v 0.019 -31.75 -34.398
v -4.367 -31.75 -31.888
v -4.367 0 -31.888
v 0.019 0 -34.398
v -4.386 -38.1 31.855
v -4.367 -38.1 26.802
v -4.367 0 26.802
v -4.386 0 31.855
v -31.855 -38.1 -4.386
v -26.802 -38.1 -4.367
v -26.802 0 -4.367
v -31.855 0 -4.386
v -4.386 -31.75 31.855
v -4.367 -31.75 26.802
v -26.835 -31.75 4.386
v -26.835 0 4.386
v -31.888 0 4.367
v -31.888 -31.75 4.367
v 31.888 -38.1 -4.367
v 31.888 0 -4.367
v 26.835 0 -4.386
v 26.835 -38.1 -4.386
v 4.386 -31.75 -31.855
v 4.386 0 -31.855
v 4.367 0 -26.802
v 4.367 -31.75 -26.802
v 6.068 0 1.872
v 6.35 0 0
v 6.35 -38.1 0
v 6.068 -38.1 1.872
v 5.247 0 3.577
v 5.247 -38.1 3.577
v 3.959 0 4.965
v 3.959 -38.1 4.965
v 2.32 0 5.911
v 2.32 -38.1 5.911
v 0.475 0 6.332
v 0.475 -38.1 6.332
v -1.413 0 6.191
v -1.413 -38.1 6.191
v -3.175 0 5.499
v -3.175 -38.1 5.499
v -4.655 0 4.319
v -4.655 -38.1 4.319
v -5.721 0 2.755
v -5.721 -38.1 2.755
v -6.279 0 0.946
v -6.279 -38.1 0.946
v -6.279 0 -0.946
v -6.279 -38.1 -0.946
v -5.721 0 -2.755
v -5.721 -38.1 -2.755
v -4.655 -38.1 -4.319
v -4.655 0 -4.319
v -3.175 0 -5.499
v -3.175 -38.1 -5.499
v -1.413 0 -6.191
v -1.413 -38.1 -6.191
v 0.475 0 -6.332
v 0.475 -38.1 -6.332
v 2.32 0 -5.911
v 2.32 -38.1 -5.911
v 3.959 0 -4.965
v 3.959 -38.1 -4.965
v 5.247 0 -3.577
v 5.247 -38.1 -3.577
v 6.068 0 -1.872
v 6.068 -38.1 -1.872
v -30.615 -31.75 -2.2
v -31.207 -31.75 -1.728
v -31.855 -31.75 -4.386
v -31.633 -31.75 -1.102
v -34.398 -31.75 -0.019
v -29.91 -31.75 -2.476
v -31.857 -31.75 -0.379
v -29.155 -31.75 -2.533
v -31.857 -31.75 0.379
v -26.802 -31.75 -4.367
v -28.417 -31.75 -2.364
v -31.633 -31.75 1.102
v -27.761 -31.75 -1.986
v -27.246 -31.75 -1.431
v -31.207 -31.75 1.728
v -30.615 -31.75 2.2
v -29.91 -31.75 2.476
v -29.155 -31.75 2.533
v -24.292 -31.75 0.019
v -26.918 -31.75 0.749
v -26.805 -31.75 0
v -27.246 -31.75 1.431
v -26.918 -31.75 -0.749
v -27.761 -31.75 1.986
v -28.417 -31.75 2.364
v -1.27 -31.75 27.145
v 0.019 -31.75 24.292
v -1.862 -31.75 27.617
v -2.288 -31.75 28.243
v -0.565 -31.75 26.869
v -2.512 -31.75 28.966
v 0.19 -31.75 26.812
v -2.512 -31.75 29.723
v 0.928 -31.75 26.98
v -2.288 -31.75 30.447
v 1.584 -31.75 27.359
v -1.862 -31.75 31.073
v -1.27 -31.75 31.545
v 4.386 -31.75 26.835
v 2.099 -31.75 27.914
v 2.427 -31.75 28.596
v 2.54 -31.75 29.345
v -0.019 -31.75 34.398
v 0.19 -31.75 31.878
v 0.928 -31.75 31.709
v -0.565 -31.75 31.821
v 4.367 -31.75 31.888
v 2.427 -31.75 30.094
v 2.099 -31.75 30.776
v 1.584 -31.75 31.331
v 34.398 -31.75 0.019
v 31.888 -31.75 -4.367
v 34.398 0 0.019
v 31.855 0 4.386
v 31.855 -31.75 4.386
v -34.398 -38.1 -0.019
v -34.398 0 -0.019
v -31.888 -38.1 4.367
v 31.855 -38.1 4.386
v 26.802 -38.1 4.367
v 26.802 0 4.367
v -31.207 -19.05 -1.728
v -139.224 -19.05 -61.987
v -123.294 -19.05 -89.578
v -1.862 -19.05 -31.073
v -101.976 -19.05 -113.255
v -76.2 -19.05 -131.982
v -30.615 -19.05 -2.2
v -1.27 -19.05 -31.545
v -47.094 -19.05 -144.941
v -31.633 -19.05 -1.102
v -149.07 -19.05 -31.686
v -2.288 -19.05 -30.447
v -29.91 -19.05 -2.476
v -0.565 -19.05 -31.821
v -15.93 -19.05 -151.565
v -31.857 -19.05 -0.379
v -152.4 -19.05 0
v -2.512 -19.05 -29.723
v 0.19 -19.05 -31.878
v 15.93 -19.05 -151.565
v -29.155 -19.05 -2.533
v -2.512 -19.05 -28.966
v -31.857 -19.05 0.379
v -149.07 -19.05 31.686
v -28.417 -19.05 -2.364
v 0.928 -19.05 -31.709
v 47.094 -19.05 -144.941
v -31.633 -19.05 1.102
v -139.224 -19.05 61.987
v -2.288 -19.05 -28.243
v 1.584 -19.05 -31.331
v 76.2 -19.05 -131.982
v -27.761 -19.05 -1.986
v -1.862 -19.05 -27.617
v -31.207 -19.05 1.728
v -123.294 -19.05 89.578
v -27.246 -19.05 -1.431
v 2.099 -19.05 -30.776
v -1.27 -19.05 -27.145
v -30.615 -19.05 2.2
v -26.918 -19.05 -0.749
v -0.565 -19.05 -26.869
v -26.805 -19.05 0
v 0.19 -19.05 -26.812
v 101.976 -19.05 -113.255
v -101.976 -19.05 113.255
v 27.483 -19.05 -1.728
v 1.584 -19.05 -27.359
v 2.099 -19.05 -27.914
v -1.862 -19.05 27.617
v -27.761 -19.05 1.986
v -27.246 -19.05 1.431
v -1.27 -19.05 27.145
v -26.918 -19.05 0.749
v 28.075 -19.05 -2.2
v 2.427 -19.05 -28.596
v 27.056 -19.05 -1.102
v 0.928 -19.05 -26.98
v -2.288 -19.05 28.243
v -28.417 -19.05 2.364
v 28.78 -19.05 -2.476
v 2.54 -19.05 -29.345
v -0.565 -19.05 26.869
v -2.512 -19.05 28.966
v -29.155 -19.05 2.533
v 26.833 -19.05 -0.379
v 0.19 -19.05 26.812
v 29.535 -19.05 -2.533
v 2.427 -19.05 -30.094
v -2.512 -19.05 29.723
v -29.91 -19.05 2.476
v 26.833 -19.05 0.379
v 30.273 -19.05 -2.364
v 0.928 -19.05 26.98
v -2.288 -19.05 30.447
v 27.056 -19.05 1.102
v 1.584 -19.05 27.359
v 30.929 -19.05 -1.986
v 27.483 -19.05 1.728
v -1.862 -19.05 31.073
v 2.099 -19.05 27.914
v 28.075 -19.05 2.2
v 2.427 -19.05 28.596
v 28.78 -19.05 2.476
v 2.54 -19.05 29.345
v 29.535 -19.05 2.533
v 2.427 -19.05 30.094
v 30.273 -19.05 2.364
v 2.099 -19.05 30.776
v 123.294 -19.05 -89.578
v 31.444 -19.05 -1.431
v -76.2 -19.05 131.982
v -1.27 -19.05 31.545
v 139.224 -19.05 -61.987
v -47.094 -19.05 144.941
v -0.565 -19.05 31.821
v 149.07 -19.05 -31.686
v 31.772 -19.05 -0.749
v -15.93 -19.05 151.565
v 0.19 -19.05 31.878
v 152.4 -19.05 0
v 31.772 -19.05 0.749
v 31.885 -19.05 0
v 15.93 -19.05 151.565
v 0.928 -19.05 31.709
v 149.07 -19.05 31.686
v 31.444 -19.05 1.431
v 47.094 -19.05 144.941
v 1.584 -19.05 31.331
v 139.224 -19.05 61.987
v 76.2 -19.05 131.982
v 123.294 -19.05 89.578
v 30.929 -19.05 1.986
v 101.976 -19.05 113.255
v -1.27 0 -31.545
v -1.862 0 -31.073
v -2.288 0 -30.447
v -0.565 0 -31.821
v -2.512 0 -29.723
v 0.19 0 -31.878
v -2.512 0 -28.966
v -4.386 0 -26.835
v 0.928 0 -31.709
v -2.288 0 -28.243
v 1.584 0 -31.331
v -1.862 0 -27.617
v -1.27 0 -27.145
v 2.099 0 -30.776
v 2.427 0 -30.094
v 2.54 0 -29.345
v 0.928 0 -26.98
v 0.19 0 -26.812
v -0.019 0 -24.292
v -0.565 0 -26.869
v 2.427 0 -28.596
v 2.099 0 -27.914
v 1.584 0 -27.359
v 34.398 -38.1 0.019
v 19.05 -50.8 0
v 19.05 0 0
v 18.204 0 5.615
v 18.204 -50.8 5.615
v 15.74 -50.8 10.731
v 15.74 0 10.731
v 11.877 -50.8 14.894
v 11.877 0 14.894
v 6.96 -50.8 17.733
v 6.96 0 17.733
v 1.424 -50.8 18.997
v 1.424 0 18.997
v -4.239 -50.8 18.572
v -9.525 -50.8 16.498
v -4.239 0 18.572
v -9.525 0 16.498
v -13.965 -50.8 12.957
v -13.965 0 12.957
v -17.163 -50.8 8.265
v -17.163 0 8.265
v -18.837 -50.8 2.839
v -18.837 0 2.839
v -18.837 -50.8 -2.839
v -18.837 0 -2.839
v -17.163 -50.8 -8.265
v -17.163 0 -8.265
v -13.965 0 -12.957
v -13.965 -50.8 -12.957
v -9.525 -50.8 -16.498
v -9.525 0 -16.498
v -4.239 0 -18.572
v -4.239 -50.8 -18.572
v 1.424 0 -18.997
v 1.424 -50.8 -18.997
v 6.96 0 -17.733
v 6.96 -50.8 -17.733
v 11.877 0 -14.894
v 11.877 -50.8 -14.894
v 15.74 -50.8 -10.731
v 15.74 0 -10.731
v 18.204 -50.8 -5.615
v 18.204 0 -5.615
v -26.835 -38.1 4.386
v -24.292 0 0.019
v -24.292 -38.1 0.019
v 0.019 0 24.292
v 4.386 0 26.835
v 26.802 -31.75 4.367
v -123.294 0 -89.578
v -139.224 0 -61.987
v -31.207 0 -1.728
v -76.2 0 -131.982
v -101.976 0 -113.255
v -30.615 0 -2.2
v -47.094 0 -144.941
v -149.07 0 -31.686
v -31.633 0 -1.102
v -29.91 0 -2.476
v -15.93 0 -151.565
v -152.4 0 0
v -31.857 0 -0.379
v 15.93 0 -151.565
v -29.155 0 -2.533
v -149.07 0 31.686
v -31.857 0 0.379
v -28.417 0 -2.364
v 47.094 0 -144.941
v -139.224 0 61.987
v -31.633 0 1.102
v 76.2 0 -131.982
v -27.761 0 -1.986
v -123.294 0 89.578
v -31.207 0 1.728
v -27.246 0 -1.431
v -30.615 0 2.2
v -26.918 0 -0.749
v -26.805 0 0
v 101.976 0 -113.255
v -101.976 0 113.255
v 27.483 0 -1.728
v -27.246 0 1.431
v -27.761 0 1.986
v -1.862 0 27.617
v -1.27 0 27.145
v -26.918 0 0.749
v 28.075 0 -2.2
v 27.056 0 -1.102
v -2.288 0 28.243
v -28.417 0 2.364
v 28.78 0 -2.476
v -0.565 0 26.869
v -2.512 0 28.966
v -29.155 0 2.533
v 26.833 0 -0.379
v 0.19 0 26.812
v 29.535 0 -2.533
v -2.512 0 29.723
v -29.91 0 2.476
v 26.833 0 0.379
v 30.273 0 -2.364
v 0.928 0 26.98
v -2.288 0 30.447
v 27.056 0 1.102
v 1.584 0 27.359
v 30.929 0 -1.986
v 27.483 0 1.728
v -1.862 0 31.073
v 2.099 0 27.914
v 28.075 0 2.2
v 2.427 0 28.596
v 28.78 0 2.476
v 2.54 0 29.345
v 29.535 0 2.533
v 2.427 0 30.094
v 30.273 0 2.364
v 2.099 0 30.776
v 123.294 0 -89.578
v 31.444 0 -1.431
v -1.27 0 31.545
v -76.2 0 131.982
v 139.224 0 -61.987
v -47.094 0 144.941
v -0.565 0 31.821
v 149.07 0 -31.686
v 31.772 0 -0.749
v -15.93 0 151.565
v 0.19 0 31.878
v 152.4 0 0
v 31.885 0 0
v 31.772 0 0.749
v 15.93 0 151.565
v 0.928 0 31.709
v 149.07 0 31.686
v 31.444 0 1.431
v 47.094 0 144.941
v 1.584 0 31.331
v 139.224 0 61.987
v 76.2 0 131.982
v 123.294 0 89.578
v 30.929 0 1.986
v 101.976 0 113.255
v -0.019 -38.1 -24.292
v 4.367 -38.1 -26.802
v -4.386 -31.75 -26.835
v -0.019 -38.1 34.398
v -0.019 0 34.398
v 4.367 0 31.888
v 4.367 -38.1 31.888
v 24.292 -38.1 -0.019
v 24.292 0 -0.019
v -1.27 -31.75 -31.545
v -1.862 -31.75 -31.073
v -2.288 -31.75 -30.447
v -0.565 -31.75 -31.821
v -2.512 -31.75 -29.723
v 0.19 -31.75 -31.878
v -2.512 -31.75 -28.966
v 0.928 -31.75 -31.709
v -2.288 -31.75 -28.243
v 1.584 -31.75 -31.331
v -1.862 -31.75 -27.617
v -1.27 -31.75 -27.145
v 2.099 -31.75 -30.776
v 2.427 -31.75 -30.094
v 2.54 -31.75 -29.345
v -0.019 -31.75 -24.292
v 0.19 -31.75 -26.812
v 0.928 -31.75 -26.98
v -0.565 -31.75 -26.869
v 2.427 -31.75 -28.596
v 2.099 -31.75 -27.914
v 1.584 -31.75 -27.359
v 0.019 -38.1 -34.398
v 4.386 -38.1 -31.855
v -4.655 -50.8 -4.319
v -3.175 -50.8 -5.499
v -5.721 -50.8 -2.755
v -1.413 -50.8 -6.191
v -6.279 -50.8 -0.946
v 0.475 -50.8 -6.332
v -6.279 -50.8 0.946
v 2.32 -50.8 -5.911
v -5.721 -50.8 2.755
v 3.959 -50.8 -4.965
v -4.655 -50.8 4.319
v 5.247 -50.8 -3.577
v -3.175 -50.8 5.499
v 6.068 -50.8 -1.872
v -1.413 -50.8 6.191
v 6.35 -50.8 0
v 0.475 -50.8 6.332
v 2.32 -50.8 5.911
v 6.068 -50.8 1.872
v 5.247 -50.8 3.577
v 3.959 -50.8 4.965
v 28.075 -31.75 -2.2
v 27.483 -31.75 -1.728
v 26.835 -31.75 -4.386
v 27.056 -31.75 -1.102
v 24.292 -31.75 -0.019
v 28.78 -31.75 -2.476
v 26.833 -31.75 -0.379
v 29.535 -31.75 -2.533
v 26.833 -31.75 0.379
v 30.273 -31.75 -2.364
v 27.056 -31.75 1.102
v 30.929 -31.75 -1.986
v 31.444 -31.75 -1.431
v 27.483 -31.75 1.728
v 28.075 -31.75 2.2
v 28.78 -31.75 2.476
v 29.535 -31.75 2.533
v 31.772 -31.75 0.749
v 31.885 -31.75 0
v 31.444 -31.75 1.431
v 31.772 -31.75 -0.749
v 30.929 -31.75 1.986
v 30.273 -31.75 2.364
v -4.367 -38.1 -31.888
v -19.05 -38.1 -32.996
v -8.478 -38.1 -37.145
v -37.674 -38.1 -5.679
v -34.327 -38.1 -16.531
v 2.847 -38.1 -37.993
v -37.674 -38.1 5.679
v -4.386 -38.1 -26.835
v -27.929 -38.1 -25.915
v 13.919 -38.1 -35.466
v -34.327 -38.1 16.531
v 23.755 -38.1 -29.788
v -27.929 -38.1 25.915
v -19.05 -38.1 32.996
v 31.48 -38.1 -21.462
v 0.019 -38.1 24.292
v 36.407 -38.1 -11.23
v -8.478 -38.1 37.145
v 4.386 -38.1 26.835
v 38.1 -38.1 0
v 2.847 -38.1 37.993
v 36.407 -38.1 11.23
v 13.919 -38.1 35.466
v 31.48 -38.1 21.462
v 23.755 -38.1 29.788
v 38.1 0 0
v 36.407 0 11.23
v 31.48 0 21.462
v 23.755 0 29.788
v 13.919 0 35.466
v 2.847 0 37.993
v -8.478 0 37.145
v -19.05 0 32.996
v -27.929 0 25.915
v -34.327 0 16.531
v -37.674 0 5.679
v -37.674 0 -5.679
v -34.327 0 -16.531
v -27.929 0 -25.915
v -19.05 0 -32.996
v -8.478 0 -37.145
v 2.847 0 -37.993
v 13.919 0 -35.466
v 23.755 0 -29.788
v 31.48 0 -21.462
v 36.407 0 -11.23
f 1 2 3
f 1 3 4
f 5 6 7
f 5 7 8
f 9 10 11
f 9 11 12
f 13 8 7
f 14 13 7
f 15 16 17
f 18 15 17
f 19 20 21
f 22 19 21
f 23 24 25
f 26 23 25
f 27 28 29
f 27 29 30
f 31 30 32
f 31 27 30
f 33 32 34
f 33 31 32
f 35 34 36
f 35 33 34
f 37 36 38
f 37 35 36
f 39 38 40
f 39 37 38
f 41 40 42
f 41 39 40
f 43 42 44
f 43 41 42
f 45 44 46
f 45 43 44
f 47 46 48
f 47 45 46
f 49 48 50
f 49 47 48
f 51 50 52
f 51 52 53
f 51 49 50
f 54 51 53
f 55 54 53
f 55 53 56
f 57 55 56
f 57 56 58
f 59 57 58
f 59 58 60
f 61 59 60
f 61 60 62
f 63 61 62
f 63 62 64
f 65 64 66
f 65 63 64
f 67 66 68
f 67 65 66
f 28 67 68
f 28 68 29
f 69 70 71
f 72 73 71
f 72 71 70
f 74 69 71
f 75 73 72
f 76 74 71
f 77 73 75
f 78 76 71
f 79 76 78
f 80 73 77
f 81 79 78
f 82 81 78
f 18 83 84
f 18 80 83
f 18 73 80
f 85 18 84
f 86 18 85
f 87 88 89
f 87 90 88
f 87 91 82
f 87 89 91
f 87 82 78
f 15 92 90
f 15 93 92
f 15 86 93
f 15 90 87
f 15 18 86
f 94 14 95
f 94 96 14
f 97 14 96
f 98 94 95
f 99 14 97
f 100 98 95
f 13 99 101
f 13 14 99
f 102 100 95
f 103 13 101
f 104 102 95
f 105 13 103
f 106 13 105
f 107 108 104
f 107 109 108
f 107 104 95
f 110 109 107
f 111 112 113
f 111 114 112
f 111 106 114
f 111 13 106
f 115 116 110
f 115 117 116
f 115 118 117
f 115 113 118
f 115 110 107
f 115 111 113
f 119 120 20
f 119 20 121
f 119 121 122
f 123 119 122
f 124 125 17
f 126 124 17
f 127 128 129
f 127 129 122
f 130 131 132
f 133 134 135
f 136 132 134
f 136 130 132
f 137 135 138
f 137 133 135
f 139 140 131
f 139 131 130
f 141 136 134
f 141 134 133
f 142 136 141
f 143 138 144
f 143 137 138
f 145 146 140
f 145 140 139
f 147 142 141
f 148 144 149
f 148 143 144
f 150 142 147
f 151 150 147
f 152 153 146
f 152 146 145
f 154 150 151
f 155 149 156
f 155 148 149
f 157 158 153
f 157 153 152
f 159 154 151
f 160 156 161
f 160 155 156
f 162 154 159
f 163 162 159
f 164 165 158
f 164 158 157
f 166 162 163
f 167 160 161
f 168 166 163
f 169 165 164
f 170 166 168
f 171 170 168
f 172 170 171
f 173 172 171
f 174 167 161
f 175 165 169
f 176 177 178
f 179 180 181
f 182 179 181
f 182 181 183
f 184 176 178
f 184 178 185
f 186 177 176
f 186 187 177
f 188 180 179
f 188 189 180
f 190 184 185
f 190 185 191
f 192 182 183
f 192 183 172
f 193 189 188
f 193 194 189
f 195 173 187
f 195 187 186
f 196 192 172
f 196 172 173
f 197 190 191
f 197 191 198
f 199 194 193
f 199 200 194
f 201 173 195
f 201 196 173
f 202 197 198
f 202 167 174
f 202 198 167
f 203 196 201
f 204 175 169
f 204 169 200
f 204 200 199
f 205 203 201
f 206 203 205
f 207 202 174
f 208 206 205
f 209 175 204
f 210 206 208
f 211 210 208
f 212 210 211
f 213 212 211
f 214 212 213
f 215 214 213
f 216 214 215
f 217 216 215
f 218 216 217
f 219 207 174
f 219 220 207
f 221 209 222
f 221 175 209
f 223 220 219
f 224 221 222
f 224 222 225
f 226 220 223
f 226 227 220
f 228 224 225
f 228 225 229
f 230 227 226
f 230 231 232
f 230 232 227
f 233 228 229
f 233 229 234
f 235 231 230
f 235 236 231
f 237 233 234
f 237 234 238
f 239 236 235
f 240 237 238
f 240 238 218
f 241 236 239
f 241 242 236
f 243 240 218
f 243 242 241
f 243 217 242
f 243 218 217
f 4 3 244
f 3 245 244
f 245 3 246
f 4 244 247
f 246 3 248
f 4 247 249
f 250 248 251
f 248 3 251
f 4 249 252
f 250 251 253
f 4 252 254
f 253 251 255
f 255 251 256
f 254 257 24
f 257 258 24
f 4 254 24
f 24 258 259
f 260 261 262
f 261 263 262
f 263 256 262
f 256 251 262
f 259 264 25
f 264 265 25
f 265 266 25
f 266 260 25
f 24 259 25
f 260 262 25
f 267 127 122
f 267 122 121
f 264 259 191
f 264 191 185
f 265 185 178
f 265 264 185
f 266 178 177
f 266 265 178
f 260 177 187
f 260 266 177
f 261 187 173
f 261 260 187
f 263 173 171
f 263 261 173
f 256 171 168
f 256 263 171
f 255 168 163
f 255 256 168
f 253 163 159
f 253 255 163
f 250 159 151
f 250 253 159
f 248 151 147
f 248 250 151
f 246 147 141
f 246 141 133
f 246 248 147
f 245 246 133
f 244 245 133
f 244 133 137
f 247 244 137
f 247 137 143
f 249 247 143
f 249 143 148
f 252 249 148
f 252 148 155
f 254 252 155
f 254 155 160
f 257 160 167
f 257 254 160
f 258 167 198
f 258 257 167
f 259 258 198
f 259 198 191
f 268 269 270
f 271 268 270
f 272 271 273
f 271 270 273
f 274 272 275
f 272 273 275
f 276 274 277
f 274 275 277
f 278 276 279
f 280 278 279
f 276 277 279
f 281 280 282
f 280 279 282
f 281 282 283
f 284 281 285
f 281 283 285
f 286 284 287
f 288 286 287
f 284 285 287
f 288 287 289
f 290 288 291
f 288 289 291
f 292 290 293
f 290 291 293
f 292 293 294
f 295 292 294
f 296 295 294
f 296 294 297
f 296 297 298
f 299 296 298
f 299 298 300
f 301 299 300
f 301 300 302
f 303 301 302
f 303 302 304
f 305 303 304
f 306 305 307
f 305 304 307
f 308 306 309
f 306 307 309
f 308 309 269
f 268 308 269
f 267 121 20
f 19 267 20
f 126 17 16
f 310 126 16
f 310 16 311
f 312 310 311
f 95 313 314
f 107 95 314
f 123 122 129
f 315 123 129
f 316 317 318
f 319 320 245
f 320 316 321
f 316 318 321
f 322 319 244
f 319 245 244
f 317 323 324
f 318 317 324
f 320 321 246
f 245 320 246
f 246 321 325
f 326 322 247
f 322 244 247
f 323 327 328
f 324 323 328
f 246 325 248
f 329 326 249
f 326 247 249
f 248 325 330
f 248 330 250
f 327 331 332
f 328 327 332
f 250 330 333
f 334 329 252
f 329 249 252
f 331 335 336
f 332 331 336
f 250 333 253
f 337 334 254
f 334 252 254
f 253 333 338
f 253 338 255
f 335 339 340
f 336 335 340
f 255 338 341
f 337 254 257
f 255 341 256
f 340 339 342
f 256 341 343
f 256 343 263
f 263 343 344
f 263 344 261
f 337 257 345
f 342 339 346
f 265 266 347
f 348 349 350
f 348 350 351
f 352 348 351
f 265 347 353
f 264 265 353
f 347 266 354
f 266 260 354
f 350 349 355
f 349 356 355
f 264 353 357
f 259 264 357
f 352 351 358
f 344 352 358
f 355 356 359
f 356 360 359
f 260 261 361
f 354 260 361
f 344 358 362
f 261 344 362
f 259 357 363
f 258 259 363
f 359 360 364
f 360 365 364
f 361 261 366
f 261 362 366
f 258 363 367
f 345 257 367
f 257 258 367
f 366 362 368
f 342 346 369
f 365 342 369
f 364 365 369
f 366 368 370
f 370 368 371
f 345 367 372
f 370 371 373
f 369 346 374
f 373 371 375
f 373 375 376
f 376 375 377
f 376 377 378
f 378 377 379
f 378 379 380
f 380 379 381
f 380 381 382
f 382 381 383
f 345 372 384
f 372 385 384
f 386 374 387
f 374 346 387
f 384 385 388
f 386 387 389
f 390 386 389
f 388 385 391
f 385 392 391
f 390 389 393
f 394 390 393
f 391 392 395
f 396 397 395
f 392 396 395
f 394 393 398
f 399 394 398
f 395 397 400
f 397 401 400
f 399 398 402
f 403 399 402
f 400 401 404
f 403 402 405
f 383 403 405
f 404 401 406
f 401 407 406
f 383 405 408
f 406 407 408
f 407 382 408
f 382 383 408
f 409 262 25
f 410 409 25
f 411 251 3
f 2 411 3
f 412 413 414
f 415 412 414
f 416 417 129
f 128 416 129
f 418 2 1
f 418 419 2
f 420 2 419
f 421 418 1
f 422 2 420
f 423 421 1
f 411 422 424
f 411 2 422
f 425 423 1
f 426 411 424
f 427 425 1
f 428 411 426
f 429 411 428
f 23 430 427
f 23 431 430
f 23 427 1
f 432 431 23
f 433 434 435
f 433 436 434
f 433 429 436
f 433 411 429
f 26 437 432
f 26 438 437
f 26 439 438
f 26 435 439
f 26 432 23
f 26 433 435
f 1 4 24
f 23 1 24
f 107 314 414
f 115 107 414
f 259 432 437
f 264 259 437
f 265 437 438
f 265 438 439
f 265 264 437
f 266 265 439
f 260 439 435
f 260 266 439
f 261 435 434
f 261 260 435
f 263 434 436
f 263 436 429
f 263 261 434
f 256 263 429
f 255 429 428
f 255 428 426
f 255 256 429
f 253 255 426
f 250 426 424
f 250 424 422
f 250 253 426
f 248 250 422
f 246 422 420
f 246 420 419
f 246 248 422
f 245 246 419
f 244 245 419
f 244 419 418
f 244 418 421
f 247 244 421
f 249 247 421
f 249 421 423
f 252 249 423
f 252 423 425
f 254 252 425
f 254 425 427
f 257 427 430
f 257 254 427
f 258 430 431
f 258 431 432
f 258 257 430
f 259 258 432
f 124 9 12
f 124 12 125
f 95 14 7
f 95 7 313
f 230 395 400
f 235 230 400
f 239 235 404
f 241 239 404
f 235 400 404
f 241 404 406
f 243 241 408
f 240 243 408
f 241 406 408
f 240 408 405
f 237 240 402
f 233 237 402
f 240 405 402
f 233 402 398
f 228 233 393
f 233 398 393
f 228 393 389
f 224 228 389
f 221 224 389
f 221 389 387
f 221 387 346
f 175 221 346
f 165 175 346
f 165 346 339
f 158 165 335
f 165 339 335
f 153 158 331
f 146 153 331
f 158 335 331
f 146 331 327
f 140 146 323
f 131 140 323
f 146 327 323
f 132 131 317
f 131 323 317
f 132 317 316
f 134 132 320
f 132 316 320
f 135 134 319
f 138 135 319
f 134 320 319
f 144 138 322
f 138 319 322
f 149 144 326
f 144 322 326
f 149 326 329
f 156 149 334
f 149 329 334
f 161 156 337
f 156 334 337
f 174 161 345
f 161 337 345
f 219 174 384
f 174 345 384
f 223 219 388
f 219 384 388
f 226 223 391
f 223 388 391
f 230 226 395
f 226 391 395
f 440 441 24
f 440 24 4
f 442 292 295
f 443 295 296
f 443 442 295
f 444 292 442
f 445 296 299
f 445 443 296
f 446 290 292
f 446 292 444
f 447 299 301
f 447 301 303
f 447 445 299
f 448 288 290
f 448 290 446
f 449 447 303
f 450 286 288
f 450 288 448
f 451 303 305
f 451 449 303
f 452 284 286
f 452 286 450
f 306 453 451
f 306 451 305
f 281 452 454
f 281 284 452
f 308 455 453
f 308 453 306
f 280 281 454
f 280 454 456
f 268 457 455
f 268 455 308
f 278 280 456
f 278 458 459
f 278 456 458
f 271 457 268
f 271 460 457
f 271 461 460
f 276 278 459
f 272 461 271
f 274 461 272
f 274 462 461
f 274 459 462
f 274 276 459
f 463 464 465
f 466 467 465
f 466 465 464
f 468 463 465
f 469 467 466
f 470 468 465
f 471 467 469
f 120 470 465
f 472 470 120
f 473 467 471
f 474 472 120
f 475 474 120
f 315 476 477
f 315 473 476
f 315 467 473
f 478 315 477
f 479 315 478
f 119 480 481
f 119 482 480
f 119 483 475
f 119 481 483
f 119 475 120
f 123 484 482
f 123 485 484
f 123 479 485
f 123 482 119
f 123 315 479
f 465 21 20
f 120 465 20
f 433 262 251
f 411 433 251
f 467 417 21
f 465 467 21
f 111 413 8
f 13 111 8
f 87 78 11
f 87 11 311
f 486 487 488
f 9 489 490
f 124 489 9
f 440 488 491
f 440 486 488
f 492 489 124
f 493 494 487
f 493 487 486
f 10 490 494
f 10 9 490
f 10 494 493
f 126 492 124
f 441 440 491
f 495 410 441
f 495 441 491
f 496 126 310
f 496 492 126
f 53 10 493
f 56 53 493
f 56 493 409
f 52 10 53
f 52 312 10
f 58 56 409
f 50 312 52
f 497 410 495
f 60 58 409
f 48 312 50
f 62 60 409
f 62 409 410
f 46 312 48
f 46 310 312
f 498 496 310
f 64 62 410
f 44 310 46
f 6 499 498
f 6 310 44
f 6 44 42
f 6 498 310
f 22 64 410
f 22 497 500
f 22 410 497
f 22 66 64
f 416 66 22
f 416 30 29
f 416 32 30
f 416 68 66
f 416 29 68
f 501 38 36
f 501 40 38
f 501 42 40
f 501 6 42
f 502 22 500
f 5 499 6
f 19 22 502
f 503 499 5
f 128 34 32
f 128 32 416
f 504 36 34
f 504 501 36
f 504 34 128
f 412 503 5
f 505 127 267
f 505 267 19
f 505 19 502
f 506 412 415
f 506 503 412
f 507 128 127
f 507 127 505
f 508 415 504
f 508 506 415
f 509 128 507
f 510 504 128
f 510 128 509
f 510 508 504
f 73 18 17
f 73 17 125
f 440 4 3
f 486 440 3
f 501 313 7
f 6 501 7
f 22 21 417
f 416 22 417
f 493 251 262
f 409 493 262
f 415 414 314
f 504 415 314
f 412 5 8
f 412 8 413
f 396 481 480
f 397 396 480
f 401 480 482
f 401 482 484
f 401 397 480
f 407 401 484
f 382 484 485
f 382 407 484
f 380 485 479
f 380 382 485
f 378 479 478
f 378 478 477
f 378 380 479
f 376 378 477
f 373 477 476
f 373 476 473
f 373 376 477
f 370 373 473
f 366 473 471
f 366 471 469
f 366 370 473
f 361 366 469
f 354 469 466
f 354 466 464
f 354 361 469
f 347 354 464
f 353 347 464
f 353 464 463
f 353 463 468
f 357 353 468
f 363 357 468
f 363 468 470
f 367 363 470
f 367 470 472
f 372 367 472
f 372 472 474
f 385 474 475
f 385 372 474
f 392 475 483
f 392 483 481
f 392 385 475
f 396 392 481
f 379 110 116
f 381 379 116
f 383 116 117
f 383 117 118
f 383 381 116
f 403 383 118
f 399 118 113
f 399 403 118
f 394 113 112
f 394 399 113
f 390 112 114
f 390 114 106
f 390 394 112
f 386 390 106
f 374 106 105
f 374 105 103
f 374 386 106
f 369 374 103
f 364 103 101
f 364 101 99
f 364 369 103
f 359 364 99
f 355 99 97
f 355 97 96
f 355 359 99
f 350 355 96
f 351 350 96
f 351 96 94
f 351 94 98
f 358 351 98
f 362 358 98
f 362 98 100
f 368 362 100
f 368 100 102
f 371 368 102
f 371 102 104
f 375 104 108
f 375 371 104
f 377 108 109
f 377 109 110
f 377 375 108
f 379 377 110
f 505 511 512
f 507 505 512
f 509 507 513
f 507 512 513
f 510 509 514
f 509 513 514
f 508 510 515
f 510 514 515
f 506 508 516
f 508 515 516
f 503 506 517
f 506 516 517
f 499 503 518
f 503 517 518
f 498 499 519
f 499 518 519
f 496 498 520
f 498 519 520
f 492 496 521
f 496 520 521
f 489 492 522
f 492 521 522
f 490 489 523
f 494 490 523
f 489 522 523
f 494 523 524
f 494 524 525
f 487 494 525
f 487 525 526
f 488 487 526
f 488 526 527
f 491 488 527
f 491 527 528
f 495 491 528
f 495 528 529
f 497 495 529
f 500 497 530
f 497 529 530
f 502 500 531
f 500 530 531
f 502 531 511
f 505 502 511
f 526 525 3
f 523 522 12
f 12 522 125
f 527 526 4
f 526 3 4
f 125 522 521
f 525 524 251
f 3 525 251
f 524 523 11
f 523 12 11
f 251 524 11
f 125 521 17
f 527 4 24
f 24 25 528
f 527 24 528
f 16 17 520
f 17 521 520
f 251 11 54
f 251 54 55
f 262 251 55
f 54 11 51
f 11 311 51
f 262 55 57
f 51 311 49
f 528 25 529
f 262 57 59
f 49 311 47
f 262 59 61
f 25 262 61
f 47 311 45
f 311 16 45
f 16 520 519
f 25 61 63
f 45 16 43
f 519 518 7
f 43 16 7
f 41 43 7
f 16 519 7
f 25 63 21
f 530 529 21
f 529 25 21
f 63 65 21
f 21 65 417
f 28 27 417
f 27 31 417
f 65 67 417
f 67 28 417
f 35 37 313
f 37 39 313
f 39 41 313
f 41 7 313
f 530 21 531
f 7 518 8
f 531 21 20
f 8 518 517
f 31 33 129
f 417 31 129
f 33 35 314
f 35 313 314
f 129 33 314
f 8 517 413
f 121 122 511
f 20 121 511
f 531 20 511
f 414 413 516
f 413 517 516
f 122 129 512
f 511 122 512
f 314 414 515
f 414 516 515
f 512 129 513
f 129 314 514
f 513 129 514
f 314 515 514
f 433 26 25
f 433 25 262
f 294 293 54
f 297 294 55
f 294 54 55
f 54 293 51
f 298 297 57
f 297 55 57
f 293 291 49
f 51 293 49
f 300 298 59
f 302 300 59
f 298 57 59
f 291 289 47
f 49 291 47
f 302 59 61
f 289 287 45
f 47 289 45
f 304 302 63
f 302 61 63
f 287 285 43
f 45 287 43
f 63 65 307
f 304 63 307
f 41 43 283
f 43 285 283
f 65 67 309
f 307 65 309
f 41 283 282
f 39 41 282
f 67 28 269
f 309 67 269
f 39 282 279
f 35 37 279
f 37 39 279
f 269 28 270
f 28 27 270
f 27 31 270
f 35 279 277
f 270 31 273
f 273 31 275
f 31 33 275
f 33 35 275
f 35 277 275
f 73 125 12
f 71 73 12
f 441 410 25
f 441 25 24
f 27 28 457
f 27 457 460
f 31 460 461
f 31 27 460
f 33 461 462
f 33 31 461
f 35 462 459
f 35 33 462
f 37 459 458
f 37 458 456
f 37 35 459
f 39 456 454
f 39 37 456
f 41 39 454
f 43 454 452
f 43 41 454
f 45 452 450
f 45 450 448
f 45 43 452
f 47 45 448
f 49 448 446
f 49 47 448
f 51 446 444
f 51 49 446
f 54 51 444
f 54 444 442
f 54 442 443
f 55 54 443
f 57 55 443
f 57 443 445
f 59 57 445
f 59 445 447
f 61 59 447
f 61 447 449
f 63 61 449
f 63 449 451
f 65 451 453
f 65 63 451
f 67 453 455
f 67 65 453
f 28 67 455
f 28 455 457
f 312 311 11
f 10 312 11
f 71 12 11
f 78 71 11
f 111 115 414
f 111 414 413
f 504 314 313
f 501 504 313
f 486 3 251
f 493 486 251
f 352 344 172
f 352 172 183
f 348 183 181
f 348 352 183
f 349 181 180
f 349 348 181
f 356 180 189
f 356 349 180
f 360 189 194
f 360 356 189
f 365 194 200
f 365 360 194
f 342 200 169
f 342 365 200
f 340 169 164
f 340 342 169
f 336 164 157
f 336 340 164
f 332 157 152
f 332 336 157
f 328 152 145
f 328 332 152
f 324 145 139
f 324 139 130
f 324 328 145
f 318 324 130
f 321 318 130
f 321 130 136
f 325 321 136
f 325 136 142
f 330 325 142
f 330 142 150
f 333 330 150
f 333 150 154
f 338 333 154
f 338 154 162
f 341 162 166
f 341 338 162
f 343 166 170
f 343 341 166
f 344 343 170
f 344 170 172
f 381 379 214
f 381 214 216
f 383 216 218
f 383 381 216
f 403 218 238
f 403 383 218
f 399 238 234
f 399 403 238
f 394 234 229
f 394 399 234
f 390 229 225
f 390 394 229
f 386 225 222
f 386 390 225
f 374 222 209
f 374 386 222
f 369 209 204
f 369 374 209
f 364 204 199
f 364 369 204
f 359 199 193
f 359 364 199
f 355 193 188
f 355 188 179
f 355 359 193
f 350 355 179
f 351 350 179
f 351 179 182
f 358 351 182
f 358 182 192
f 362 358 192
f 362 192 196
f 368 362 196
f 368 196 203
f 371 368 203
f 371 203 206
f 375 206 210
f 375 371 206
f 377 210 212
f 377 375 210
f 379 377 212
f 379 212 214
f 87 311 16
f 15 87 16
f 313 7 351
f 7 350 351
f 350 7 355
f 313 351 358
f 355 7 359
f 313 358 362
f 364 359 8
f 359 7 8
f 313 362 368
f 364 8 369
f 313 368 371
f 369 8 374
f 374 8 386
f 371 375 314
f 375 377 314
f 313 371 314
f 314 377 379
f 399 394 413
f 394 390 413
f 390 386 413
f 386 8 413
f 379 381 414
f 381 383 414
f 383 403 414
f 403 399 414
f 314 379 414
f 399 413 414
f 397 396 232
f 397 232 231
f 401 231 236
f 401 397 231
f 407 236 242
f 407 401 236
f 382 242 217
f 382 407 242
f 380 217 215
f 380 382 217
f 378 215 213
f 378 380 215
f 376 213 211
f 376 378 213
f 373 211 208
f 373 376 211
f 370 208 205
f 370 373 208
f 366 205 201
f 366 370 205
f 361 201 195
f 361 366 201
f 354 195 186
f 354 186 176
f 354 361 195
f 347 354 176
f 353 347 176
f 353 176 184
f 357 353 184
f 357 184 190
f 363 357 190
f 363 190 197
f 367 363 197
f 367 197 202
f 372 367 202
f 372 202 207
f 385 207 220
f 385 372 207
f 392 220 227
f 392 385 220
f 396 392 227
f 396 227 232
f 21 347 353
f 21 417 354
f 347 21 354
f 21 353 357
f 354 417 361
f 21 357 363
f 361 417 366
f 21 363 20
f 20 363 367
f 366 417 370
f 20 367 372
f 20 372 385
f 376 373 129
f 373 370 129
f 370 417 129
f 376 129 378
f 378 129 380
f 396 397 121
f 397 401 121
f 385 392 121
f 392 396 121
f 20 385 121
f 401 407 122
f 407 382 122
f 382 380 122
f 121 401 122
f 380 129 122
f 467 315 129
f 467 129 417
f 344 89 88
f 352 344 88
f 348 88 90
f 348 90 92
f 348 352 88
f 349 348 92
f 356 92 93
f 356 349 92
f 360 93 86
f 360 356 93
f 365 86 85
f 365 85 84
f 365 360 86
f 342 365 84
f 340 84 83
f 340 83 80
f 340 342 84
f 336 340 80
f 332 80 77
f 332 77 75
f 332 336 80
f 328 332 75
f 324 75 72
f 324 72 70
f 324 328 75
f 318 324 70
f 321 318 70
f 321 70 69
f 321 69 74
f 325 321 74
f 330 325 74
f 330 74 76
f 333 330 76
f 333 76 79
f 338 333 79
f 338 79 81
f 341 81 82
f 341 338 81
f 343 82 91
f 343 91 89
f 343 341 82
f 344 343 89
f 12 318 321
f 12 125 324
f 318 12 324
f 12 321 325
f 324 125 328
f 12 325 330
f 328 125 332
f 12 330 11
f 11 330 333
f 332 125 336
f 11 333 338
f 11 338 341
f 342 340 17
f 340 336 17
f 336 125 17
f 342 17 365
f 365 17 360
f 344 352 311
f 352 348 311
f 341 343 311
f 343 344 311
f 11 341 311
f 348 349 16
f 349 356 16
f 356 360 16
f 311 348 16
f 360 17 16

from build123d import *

# Parameters (mm, degrees)
F0_R     = 152.4
F0_R_2   = 38.1
F0_R_3   = 19.05
F0_R_4   = 2.54
F0_R_5   = 6.35
F1_DEPTH = 19.05
F2_DEPTH = 38.1
F3_DEPTH = 50.8
F4_DEPTH = 31.75


with BuildPart() as f1:
    # F0 (on Front) → F1 (new body)
    with BuildSketch(Plane.XZ):
        Circle(F0_R)
        Circle(F0_R_2, mode=Mode.SUBTRACT)
        Circle(F0_R_2)
        Polygon((4.366562, -26.801935), (4.385527, -31.854956), (0.018965, -34.39789), (-4.366562, -31.887804), (-4.385527, -26.834784), (-0.018965, -24.291849), align=None, mode=Mode.SUBTRACT)
        Polygon((-31.887804, 4.366562), (-26.834784, 4.385527), (-24.291849, 0.018965), (-26.801935, -4.366562), (-31.854956, -4.385527), (-34.39789, -0.018965), align=None, mode=Mode.SUBTRACT)
        Circle(F0_R_3, mode=Mode.SUBTRACT)
        Polygon((26.801935, 4.366562), (31.854956, 4.385527), (34.39789, 0.018965), (31.887804, -4.366562), (26.834784, -4.385527), (24.291849, -0.018965), align=None, mode=Mode.SUBTRACT)
        Polygon((-4.366562, 26.801935), (-4.385527, 31.854956), (-0.018965, 34.39789), (4.366562, 31.887804), (4.385527, 26.834784), (0.018965, 24.291849), align=None, mode=Mode.SUBTRACT)
        Polygon((0.018965, -34.39789), (4.385527, -31.854956), (4.366562, -26.801935), (-0.018965, -24.291849), (-4.385527, -26.834784), (-4.366562, -31.887804), align=None)
        with Locations((0, -29.34487)):
            Circle(F0_R_4, mode=Mode.SUBTRACT)
        Polygon((-24.291849, 0.018965), (-26.834784, 4.385527), (-31.887804, 4.366562), (-34.39789, -0.018965), (-31.854956, -4.385527), (-26.801935, -4.366562), align=None)
        with Locations((-29.34487, 0)):
            Circle(F0_R_4, mode=Mode.SUBTRACT)
        Polygon((-0.018965, 34.39789), (-4.385527, 31.854956), (-4.366562, 26.801935), (0.018965, 24.291849), (4.385527, 26.834784), (4.366562, 31.887804), align=None)
        with Locations((0, 29.34487)):
            Circle(F0_R_4, mode=Mode.SUBTRACT)
        Polygon((34.39789, 0.018965), (31.854956, 4.385527), (26.801935, 4.366562), (24.291849, -0.018965), (26.834784, -4.385527), (31.887804, -4.366562), align=None)
        with Locations((29.34487, 0)):
            Circle(F0_R_4, mode=Mode.SUBTRACT)
        Circle(F0_R_3)
        Circle(F0_R_5, mode=Mode.SUBTRACT)
        Circle(F0_R_5)
    extrude(amount=F1_DEPTH)


with BuildPart() as f2:
    # F0 (on Front) → F2 (new body)
    with BuildSketch(Plane.XZ):
        Circle(F0_R_2)
        Polygon((4.366562, -26.801935), (4.385527, -31.854956), (0.018965, -34.39789), (-4.366562, -31.887804), (-4.385527, -26.834784), (-0.018965, -24.291849), align=None, mode=Mode.SUBTRACT)
        Polygon((-31.887804, 4.366562), (-26.834784, 4.385527), (-24.291849, 0.018965), (-26.801935, -4.366562), (-31.854956, -4.385527), (-34.39789, -0.018965), align=None, mode=Mode.SUBTRACT)
        Circle(F0_R_3, mode=Mode.SUBTRACT)
        Polygon((26.801935, 4.366562), (31.854956, 4.385527), (34.39789, 0.018965), (31.887804, -4.366562), (26.834784, -4.385527), (24.291849, -0.018965), align=None, mode=Mode.SUBTRACT)
        Polygon((-4.366562, 26.801935), (-4.385527, 31.854956), (-0.018965, 34.39789), (4.366562, 31.887804), (4.385527, 26.834784), (0.018965, 24.291849), align=None, mode=Mode.SUBTRACT)
        Circle(F0_R_3)
        Circle(F0_R_5, mode=Mode.SUBTRACT)
    extrude(amount=F2_DEPTH)


with BuildPart() as f3:
    # F0 (on Front) → F3 (new body)
    with BuildSketch(Plane.XZ):
        Circle(F0_R_3)
        Circle(F0_R_5, mode=Mode.SUBTRACT)
    extrude(amount=F3_DEPTH)


with BuildPart() as f4:
    # F0 (on Front) → F4 (new body)
    with BuildSketch(Plane.XZ):
        Polygon((-24.291849, 0.018965), (-26.834784, 4.385527), (-31.887804, 4.366562), (-34.39789, -0.018965), (-31.854956, -4.385527), (-26.801935, -4.366562), align=None)
        with Locations((-29.34487, 0)):
            Circle(F0_R_4, mode=Mode.SUBTRACT)
        Polygon((0.018965, -34.39789), (4.385527, -31.854956), (4.366562, -26.801935), (-0.018965, -24.291849), (-4.385527, -26.834784), (-4.366562, -31.887804), align=None)
        with Locations((0, -29.34487)):
            Circle(F0_R_4, mode=Mode.SUBTRACT)
        Polygon((34.39789, 0.018965), (31.854956, 4.385527), (26.801935, 4.366562), (24.291849, -0.018965), (26.834784, -4.385527), (31.887804, -4.366562), align=None)
        with Locations((29.34487, 0)):
            Circle(F0_R_4, mode=Mode.SUBTRACT)
        Polygon((-0.018965, 34.39789), (-4.385527, 31.854956), (-4.366562, 26.801935), (0.018965, 24.291849), (4.385527, 26.834784), (4.366562, 31.887804), align=None)
        with Locations((0, 29.34487)):
            Circle(F0_R_4, mode=Mode.SUBTRACT)
    extrude(amount=F4_DEPTH)


solid = Compound([f1.part, f2.part, f3.part, f4.part])
